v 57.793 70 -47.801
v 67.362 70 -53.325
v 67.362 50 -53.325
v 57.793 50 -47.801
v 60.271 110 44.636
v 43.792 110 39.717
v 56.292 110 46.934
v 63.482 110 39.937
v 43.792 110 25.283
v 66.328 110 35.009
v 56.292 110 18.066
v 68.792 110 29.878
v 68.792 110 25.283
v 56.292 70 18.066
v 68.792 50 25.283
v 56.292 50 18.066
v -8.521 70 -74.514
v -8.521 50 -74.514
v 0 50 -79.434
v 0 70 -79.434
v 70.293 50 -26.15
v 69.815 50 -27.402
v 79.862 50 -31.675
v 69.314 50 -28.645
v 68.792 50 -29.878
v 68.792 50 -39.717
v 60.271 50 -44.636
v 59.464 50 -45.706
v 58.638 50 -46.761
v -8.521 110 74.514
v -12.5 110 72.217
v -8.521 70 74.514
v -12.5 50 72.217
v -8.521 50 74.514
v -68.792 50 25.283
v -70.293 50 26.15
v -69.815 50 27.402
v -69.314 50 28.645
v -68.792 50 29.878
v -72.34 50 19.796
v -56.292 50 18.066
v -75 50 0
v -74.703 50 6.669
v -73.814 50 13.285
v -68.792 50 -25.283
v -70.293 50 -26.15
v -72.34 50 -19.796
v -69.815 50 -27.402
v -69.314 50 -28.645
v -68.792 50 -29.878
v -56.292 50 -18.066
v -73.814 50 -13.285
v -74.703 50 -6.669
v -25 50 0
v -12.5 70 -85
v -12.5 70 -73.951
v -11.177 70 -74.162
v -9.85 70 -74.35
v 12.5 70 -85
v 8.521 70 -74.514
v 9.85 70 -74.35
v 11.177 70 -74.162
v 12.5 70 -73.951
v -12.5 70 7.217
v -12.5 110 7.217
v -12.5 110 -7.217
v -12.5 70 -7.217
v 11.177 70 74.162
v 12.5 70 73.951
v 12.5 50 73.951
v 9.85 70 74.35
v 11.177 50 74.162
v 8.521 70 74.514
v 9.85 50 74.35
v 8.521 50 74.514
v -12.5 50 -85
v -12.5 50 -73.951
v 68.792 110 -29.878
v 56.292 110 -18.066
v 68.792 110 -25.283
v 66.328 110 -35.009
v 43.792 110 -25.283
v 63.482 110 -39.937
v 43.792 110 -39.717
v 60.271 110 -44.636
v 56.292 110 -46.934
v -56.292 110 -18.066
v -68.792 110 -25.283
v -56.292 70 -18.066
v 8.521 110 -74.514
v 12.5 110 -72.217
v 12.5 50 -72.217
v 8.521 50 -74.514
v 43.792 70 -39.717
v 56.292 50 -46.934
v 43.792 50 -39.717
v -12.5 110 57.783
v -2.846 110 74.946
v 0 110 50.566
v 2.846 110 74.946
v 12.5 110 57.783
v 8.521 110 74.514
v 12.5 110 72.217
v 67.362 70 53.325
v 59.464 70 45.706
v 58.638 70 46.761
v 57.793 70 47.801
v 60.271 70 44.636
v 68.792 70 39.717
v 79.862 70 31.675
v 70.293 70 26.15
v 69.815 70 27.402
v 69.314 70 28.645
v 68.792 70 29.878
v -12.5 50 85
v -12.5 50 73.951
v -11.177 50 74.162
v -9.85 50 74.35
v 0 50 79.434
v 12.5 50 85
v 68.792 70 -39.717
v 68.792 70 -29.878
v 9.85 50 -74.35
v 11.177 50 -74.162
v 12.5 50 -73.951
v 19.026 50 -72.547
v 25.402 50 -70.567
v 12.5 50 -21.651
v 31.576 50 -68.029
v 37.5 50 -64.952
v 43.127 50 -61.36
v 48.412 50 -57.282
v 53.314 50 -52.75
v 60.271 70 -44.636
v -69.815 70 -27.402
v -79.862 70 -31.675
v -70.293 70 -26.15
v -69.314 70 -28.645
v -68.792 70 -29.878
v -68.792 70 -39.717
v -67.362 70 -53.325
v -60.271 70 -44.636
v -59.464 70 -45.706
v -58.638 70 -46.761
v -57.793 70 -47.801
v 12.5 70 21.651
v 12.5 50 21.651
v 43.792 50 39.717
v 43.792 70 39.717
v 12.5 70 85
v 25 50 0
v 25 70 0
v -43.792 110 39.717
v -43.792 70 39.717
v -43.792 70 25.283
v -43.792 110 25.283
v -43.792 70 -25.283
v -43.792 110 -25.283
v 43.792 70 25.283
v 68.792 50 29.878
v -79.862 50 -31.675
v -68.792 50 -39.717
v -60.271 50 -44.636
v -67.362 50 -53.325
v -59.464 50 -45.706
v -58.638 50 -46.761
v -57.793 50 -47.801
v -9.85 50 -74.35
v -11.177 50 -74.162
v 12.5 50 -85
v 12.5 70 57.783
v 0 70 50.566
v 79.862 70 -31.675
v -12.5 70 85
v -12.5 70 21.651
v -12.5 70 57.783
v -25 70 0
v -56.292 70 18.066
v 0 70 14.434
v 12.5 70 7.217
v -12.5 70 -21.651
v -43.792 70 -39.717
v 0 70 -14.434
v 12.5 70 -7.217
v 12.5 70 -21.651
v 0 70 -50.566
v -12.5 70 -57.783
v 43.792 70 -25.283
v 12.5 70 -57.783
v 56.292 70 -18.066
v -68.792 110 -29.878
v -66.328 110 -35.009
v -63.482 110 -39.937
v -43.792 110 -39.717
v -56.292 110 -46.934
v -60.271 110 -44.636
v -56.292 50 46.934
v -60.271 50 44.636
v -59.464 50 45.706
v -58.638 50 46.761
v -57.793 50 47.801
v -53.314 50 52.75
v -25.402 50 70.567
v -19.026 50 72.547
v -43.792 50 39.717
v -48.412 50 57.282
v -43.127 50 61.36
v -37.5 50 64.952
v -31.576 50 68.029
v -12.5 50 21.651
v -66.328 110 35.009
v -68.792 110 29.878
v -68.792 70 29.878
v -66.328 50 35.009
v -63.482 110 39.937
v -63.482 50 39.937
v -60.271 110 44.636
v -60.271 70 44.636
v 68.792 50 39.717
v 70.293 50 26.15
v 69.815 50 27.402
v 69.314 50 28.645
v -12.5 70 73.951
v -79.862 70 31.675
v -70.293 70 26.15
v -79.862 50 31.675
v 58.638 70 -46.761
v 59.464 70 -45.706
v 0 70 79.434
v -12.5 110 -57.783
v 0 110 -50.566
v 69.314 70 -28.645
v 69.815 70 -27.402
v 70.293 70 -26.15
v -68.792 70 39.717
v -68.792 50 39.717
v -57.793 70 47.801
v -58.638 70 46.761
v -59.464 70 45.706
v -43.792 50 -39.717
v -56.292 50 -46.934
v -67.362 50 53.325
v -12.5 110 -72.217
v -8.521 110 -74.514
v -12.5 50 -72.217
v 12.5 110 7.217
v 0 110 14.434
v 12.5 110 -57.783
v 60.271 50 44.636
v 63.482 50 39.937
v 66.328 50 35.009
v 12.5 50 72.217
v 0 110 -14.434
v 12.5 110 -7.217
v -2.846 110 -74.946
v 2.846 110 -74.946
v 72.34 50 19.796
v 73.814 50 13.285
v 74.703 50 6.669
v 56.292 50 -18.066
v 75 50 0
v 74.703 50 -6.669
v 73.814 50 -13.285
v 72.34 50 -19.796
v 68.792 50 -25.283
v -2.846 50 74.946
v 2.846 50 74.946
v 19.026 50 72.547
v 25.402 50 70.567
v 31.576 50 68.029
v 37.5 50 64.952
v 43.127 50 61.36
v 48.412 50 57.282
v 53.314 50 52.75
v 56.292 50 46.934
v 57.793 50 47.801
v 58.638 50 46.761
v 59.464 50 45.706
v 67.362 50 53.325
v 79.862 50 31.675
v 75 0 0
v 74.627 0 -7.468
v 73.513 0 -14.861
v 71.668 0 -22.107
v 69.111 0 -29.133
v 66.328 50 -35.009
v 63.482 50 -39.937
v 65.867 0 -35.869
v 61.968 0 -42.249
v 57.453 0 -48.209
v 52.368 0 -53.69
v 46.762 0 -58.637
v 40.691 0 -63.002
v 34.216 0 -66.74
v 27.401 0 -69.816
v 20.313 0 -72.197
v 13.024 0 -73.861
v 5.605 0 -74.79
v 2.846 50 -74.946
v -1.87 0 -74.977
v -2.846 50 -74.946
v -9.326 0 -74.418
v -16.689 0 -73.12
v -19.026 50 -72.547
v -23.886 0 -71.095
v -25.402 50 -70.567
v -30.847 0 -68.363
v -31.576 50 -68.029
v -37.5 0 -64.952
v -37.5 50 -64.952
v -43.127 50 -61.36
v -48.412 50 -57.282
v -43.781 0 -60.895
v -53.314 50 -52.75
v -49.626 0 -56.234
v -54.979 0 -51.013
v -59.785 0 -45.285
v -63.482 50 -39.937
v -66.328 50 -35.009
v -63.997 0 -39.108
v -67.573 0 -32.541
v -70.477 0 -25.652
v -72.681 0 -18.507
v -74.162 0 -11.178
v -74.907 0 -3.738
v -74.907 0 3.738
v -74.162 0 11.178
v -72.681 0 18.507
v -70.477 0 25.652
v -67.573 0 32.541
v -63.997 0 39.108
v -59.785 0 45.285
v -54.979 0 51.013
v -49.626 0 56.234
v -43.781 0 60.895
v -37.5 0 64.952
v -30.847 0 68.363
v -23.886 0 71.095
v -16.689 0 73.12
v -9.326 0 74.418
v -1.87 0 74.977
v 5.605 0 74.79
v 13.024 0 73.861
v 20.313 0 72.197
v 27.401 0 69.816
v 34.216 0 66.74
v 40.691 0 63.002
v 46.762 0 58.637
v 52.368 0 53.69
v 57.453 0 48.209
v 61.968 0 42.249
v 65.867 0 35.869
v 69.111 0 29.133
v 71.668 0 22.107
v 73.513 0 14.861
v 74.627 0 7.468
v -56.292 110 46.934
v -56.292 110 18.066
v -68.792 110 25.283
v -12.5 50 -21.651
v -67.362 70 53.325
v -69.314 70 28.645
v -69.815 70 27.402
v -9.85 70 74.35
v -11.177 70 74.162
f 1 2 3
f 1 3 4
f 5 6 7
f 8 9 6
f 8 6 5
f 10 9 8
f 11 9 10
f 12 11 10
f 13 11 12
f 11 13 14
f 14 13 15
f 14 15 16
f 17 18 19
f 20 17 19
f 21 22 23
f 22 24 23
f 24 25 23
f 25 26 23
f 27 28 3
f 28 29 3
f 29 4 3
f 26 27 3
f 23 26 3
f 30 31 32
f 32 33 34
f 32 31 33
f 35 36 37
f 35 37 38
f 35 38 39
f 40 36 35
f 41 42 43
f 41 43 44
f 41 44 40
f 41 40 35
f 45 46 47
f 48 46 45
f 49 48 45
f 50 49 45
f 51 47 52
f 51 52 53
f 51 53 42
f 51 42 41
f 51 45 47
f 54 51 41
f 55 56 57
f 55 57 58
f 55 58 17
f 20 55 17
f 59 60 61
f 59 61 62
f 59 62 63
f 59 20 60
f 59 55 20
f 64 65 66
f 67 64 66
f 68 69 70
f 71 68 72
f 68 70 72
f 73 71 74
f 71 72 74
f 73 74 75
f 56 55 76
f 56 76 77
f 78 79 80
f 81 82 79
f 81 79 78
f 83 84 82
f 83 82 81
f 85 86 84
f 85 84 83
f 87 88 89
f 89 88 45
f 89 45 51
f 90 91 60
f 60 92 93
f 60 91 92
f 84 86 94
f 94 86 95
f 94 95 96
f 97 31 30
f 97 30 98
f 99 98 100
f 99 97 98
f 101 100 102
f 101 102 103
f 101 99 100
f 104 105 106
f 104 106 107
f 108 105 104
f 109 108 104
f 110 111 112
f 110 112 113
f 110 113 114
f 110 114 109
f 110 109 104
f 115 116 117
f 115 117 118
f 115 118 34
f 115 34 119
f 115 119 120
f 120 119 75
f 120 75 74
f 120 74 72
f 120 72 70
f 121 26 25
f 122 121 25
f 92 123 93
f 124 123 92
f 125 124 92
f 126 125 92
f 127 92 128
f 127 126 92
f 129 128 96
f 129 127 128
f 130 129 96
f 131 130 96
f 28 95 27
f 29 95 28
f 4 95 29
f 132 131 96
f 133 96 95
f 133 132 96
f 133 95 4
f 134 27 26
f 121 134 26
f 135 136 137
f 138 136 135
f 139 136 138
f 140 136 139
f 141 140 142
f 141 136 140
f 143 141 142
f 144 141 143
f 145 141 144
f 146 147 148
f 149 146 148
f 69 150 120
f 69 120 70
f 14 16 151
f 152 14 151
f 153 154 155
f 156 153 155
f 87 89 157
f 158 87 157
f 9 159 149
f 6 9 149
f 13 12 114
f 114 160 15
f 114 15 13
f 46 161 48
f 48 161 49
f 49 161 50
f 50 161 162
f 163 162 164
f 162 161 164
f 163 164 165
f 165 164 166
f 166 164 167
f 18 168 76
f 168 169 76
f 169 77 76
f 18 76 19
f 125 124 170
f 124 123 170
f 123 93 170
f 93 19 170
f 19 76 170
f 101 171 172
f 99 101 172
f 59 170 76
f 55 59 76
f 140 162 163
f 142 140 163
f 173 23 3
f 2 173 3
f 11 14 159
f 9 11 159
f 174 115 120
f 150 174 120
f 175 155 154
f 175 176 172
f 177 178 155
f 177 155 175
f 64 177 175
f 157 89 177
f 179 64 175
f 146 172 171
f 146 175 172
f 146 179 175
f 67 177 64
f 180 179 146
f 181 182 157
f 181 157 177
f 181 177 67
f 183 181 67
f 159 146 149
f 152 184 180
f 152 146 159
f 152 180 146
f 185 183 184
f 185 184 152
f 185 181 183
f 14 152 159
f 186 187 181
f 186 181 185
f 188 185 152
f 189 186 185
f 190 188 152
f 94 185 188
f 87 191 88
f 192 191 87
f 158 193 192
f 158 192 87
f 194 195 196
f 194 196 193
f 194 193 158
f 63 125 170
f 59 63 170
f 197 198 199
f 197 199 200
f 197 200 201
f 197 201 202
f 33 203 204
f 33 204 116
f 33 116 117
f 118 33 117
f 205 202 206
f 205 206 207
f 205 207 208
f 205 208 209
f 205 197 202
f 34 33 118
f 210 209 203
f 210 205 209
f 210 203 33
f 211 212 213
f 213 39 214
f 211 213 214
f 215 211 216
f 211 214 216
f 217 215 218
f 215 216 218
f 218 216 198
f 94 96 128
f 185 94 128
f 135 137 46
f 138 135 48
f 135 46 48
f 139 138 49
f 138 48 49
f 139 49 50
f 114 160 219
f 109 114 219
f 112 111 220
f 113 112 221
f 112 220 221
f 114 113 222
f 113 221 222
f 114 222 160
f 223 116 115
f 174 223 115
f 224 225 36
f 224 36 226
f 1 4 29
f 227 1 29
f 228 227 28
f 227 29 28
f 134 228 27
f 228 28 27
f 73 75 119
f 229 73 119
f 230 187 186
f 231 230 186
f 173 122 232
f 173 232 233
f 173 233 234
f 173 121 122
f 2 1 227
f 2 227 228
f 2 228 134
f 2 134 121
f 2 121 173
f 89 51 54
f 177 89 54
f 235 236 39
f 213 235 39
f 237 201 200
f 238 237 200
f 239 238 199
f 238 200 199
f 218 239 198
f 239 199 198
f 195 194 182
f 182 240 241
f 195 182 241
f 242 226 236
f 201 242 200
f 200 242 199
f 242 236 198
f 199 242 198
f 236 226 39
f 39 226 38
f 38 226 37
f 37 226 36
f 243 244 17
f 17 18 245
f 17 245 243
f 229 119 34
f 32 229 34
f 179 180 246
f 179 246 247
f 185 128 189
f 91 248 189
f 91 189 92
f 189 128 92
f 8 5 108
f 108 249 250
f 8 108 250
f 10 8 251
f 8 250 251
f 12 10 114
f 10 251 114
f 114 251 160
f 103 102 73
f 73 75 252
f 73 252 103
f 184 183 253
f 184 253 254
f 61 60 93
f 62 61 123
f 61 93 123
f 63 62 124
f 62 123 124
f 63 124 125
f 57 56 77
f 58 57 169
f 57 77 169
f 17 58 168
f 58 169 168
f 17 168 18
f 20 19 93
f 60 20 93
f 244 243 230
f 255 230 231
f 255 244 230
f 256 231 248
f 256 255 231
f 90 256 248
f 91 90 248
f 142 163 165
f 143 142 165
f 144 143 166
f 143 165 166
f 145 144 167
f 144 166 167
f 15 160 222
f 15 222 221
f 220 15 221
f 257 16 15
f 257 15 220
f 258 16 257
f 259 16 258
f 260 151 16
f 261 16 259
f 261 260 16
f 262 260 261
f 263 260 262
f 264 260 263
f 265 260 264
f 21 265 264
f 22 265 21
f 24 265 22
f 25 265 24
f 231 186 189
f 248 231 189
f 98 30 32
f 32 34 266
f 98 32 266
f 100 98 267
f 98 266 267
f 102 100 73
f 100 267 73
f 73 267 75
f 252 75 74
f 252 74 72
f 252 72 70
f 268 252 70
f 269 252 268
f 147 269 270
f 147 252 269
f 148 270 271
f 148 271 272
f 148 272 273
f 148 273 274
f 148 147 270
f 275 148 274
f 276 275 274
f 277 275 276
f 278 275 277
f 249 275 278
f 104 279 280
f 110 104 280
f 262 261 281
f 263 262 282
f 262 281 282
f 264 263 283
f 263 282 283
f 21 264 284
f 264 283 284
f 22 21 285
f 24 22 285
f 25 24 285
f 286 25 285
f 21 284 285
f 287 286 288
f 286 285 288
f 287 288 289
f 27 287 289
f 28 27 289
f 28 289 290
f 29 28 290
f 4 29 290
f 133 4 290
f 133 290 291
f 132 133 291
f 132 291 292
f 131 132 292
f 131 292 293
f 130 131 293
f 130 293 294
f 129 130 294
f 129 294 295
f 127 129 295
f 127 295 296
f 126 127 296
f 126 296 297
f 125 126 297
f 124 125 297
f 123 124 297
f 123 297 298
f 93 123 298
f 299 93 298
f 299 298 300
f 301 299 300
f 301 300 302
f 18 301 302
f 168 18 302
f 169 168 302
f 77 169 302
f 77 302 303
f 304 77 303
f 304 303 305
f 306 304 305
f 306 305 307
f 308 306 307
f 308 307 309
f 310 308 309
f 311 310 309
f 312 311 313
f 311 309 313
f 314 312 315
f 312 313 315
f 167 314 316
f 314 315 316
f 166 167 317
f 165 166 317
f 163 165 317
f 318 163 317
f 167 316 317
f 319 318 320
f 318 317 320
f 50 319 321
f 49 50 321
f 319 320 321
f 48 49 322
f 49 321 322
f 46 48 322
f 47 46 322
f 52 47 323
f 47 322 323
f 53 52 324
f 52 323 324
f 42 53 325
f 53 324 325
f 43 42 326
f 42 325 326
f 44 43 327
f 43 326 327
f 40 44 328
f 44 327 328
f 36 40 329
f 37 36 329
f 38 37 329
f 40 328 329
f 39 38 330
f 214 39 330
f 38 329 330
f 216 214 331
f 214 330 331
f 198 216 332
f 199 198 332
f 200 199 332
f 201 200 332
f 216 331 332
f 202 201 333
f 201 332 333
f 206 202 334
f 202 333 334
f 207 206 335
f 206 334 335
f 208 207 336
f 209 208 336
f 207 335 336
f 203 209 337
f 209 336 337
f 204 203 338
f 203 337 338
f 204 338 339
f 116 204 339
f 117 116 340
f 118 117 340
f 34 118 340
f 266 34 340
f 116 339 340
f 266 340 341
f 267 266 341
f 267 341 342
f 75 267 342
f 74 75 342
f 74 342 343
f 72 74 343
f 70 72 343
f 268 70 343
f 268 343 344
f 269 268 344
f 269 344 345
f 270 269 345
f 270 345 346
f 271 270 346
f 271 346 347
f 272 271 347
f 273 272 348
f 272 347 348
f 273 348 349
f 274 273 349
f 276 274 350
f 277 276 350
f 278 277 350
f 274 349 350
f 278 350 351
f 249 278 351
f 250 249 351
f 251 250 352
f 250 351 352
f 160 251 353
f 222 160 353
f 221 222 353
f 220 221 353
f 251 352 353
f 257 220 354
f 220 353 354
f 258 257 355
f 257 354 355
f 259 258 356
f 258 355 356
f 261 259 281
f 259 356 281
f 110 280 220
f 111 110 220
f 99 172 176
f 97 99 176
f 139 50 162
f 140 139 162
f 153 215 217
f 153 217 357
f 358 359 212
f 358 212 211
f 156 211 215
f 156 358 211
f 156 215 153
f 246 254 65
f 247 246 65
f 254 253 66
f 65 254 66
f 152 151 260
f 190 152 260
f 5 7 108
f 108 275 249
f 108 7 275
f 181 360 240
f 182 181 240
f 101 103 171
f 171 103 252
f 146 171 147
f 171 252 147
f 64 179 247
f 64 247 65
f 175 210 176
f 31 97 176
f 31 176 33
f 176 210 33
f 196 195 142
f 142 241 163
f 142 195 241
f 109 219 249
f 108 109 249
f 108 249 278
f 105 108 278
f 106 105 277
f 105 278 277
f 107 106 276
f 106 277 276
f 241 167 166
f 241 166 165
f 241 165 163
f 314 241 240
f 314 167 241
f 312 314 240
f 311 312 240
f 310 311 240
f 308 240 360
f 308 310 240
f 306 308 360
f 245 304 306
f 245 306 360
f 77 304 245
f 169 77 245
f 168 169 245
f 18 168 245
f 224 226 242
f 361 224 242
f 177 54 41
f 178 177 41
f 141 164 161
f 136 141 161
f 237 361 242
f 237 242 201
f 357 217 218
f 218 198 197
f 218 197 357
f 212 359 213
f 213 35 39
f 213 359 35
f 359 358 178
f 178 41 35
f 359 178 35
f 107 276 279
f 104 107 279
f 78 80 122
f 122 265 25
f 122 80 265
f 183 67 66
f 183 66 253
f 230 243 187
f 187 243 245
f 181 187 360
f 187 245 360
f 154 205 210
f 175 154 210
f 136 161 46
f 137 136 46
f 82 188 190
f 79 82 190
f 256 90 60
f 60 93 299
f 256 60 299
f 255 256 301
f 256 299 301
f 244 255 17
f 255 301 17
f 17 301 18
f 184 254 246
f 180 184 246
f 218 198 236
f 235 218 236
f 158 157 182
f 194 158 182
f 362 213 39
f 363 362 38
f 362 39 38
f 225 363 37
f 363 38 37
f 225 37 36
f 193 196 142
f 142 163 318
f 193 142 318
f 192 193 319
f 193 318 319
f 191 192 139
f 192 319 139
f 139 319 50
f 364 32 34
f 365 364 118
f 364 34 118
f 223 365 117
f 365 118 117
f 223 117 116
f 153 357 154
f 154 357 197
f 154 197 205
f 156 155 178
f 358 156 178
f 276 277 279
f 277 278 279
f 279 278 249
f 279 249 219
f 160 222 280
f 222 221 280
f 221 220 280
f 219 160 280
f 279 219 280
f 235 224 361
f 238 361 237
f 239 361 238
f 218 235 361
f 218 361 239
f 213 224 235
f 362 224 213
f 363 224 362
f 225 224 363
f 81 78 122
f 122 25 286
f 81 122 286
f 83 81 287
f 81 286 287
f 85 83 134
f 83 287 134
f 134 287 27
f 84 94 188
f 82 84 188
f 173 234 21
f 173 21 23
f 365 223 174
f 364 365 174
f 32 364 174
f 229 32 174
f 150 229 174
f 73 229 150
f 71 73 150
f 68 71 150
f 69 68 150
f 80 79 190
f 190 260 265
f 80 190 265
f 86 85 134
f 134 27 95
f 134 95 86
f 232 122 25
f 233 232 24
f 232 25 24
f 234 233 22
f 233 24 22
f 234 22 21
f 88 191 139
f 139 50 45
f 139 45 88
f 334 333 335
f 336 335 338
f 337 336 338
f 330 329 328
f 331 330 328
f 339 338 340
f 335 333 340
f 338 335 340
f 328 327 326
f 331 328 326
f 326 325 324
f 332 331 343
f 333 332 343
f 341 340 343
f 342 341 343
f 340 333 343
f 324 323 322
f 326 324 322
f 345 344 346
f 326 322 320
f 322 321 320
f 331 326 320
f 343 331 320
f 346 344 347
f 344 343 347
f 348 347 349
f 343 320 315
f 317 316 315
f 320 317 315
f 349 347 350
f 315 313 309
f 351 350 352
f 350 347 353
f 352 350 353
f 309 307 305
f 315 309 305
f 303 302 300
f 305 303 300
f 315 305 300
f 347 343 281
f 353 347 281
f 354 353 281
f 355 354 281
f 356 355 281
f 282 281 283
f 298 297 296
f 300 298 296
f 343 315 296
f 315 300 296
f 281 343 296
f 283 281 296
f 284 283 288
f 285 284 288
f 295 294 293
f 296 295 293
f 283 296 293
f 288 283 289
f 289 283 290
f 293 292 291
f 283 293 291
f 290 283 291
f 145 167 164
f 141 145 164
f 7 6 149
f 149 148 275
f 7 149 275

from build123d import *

# Parameters (mm, degrees)
SKETCH1_R           = 75
BOSS_EXTRUDE1_DEPTH = 50
BOSS_EXTRUDE2_DEPTH = 60
BOSS_EXTRUDE3_DEPTH = 20


with BuildPart() as part:
    # Sketch1 → Boss-Extrude1 (new body)
    with BuildSketch(Plane(origin=(0, 0, 0), x_dir=(1, 0, 0), z_dir=(0, 1, 0))):
        Circle(SKETCH1_R)
    extrude(amount=BOSS_EXTRUDE1_DEPTH)

    # Sketch2 → Boss-Extrude2 (add)
    with BuildSketch(Plane(origin=(0, 50, 0), x_dir=(1, 0, 0), z_dir=(0, 1, 0))):
        with BuildLine():
            Line((68.791651246, -29.878231521), (68.791651246, -25.283121635))
            Line((68.791651246, -25.283121635), (56.291651246, -18.06624327))
            Line((56.291651246, -18.06624327), (43.791651246, -25.283121635))
            Line((43.791651246, -25.283121635), (43.791651246, -39.716878365))
            Line((43.791651246, -39.716878365), (56.291651246, -46.93375673))
            Line((56.291651246, -46.93375673), (60.271133141, -44.636201787))
            ThreePointArc((60.271133141, -44.636201787), (64.951905284, -37.5), (68.791651246, -29.878231521))
        make_face()
        with BuildLine():
            Line((43.791651246, 25.283121635), (56.291651246, 18.06624327))
            Line((56.291651246, 18.06624327), (68.791651246, 25.283121635))
            Line((68.791651246, 25.283121635), (68.791651246, 29.878231521))
            ThreePointArc((68.791651246, 29.878231521), (64.951905284, 37.5), (60.271133141, 44.636201787))
            Line((60.271133141, 44.636201787), (56.291651246, 46.93375673))
            Line((56.291651246, 46.93375673), (43.791651246, 39.716878365))
            Line((43.791651246, 39.716878365), (43.791651246, 25.283121635))
        make_face()
        with BuildLine():
            Line((12.5, -72.216878365), (12.5, -57.783121635))
            Line((12.5, -57.783121635), (0, -50.56624327))
            Line((0, -50.56624327), (-12.5, -57.783121635))
            Line((-12.5, -57.783121635), (-12.5, -72.216878365))
            Line((-12.5, -72.216878365), (-8.520518105, -74.514433308))
            ThreePointArc((-8.520518105, -74.514433308), (0, -75), (8.520518105, -74.514433308))
            Line((8.520518105, -74.514433308), (12.5, -72.216878365))
        make_face()
        with BuildLine():
            Line((0, 50.56624327), (12.5, 57.783121635))
            Line((12.5, 57.783121635), (12.5, 72.216878365))
            Line((12.5, 72.216878365), (8.520518105, 74.514433308))
            ThreePointArc((8.520518105, 74.514433308), (0, 75), (-8.520518105, 74.514433308))
            Line((-8.520518105, 74.514433308), (-12.5, 72.216878365))
            Line((-12.5, 72.216878365), (-12.5, 57.783121635))
            Line((-12.5, 57.783121635), (0, 50.56624327))
        make_face()
        with BuildLine():
            Line((-56.291651246, -46.93375673), (-43.791651246, -39.716878365))
            Line((-43.791651246, -39.716878365), (-43.791651246, -25.283121635))
            Line((-43.791651246, -25.283121635), (-56.291651246, -18.06624327))
            Line((-56.291651246, -18.06624327), (-68.791651246, -25.283121635))
            Line((-68.791651246, -25.283121635), (-68.791651246, -29.878231521))
            ThreePointArc((-68.791651246, -29.878231521), (-64.951905284, -37.5), (-60.271133141, -44.636201787))
            Line((-60.271133141, -44.636201787), (-56.291651246, -46.93375673))
        make_face()
        with BuildLine():
            Line((-43.791651246, 25.283121635), (-43.791651246, 39.716878365))
            Line((-43.791651246, 39.716878365), (-56.291651246, 46.93375673))
            Line((-56.291651246, 46.93375673), (-60.271133141, 44.636201787))
            ThreePointArc((-60.271133141, 44.636201787), (-64.951905284, 37.5), (-68.791651246, 29.878231521))
            Line((-68.791651246, 29.878231521), (-68.791651246, 25.283121635))
            Line((-68.791651246, 25.283121635), (-56.291651246, 18.06624327))
            Line((-56.291651246, 18.06624327), (-43.791651246, 25.283121635))
        make_face()
        Polygon((0, 14.43375673), (-12.5, 7.216878365), (-12.5, -7.216878365), (0, -14.43375673), (12.5, -7.216878365), (12.5, 7.216878365), align=None)
    extrude(amount=BOSS_EXTRUDE2_DEPTH)

    # Sketch2_3 → Boss-Extrude3 (add)
    # profile 1 of 7: a face of its own
    with BuildSketch(Plane(origin=(0, 50, 0), x_dir=(1, 0, 0), z_dir=(0, 1, 0))):
        Polygon((43.791651246, -25.283121635), (56.291651246, -18.06624327), (25, 0), (56.291651246, 18.06624327), (43.791651246, 25.283121635), (43.791651246, 39.716878365), (12.5, 21.650635095), (12.5, 57.783121635), (0, 50.56624327), (-12.5, 57.783121635), (-12.5, 21.650635095), (-43.791651246, 39.716878365), (-43.791651246, 25.283121635), (-56.291651246, 18.06624327), (-25, 0), (-56.291651246, -18.06624327), (-43.791651246, -25.283121635), (-43.791651246, -39.716878365), (-12.5, -21.650635095), (-12.5, -57.783121635), (0, -50.56624327), (12.5, -57.783121635), (12.5, -21.650635095), (43.791651246, -39.716878365), align=None)
        Polygon((-12.5, -7.216878365), (-12.5, 7.216878365), (0, 14.43375673), (12.5, 7.216878365), (12.5, -7.216878365), (0, -14.43375673), align=None, mode=Mode.SUBTRACT)
    # profile 2 of 7: a face of its own
    with BuildSketch(Plane(origin=(0, 50, 0), x_dir=(1, 0, 0), z_dir=(0, 1, 0))):
        with BuildLine():
            Line((79.862159322, -31.674682453), (70.293442287, -26.150181097))
            ThreePointArc((70.293442287, -26.150181097), (69.567524038, -28.024268041), (68.791651246, -29.878231521))
            Line((68.791651246, -29.878231521), (68.791651246, -39.716878365))
            Line((68.791651246, -39.716878365), (60.271133141, -44.636201787))
            ThreePointArc((60.271133141, -44.636201787), (59.053490065, -46.235109075), (57.793442287, -47.800816192))
            Line((57.793442287, -47.800816192), (67.362159322, -53.325317547))
            Line((67.362159322, -53.325317547), (79.862159322, -31.674682453))
        make_face()
    # profile 3 of 7: a face of its own
    with BuildSketch(Plane(origin=(0, 50, 0), x_dir=(1, 0, 0), z_dir=(0, 1, 0))):
        with BuildLine():
            ThreePointArc((68.791651246, 29.878231521), (69.567524038, 28.024268041), (70.293442287, 26.150181097))
            Line((70.293442287, 26.150181097), (79.862159322, 31.674682453))
            Line((79.862159322, 31.674682453), (67.362159322, 53.325317547))
            Line((67.362159322, 53.325317547), (57.793442287, 47.800816192))
            ThreePointArc((57.793442287, 47.800816192), (59.053490065, 46.235109075), (60.271133141, 44.636201787))
            Line((60.271133141, 44.636201787), (68.791651246, 39.716878365))
            Line((68.791651246, 39.716878365), (68.791651246, 29.878231521))
        make_face()
    # profile 4 of 7: a face of its own
    with BuildSketch(Plane(origin=(0, 50, 0), x_dir=(1, 0, 0), z_dir=(0, 1, 0))):
        with BuildLine():
            Line((12.5, -85), (12.5, -73.950997289))
            ThreePointArc((12.5, -73.950997289), (10.514033973, -74.259377116), (8.520518105, -74.514433308))
            Line((8.520518105, -74.514433308), (0, -79.43375673))
            Line((0, -79.43375673), (-8.520518105, -74.514433308))
            ThreePointArc((-8.520518105, -74.514433308), (-10.514033973, -74.259377116), (-12.5, -73.950997289))
            Line((-12.5, -73.950997289), (-12.5, -85))
            Line((-12.5, -85), (12.5, -85))
        make_face()
    # profile 5 of 7: a face of its own
    with BuildSketch(Plane(origin=(0, 50, 0), x_dir=(1, 0, 0), z_dir=(0, 1, 0))):
        with BuildLine():
            ThreePointArc((8.520518105, 74.514433308), (10.514033973, 74.259377116), (12.5, 73.950997289))
            Line((12.5, 73.950997289), (12.5, 85))
            Line((12.5, 85), (-12.5, 85))
            Line((-12.5, 85), (-12.5, 73.950997289))
            ThreePointArc((-12.5, 73.950997289), (-10.514033973, 74.259377116), (-8.520518105, 74.514433308))
            Line((-8.520518105, 74.514433308), (0, 79.43375673))
            Line((0, 79.43375673), (8.520518105, 74.514433308))
        make_face()
    # profile 6 of 7: a face of its own
    with BuildSketch(Plane(origin=(0, 50, 0), x_dir=(1, 0, 0), z_dir=(0, 1, 0))):
        with BuildLine():
            Line((-67.362159322, -53.325317547), (-57.793442287, -47.800816192))
            ThreePointArc((-57.793442287, -47.800816192), (-59.053490065, -46.235109075), (-60.271133141, -44.636201787))
            Line((-60.271133141, -44.636201787), (-68.791651246, -39.716878365))
            Line((-68.791651246, -39.716878365), (-68.791651246, -29.878231521))
            ThreePointArc((-68.791651246, -29.878231521), (-69.567524038, -28.024268041), (-70.293442287, -26.150181097))
            Line((-70.293442287, -26.150181097), (-79.862159322, -31.674682453))
            Line((-79.862159322, -31.674682453), (-67.362159322, -53.325317547))
        make_face()
    # profile 7 of 7: a face of its own
    with BuildSketch(Plane(origin=(0, 50, 0), x_dir=(1, 0, 0), z_dir=(0, 1, 0))):
        with BuildLine():
            ThreePointArc((-60.271133141, 44.636201787), (-59.053490065, 46.235109075), (-57.793442287, 47.800816192))
            Line((-57.793442287, 47.800816192), (-67.362159322, 53.325317547))
            Line((-67.362159322, 53.325317547), (-79.862159322, 31.674682453))
            Line((-79.862159322, 31.674682453), (-70.293442287, 26.150181097))
            ThreePointArc((-70.293442287, 26.150181097), (-69.567524038, 28.024268041), (-68.791651246, 29.878231521))
            Line((-68.791651246, 29.878231521), (-68.791651246, 39.716878365))
            Line((-68.791651246, 39.716878365), (-60.271133141, 44.636201787))
        make_face()
    extrude(amount=BOSS_EXTRUDE3_DEPTH)


with BuildPart() as boss_extrude3_piece_1:
    # of the separate pieces the step leaves, piece 1, a body of its own (boss_extrude3_pieces)
    add(part.part.solids().sort_by_distance((75, 50, 0))[0])


with BuildPart() as boss_extrude3_piece_2:
    # of the separate pieces the step leaves, piece 2, a body of its own (boss_extrude3_pieces)
    add(part.part.solids().sort_by_distance((57.793442287, 70, -47.800816192))[0])


with BuildPart() as boss_extrude3_piece_3:
    # of the separate pieces the step leaves, piece 3, a body of its own (boss_extrude3_pieces)
    add(part.part.solids().sort_by_distance((70.293442287, 70, 26.150181097))[0])


with BuildPart() as boss_extrude3_piece_4:
    # of the separate pieces the step leaves, piece 4, a body of its own (boss_extrude3_pieces)
    add(part.part.solids().sort_by_distance((-12.5, 70, -73.950997289))[0])


with BuildPart() as boss_extrude3_piece_5:
    # of the separate pieces the step leaves, piece 5, a body of its own (boss_extrude3_pieces)
    add(part.part.solids().sort_by_distance((12.5, 70, 73.950997289))[0])


with BuildPart() as boss_extrude3_piece_6:
    # of the separate pieces the step leaves, piece 6, a body of its own (boss_extrude3_pieces)
    add(part.part.solids().sort_by_distance((-70.293442287, 70, -26.150181097))[0])


with BuildPart() as boss_extrude3_piece_7:
    # of the separate pieces the step leaves, piece 7, a body of its own (boss_extrude3_pieces)
    add(part.part.solids().sort_by_distance((-57.793442287, 70, 47.800816192))[0])


solid = Compound([boss_extrude3_piece_1.part, boss_extrude3_piece_2.part, boss_extrude3_piece_3.part, boss_extrude3_piece_4.part, boss_extrude3_piece_5.part, boss_extrude3_piece_6.part, boss_extrude3_piece_7.part])
